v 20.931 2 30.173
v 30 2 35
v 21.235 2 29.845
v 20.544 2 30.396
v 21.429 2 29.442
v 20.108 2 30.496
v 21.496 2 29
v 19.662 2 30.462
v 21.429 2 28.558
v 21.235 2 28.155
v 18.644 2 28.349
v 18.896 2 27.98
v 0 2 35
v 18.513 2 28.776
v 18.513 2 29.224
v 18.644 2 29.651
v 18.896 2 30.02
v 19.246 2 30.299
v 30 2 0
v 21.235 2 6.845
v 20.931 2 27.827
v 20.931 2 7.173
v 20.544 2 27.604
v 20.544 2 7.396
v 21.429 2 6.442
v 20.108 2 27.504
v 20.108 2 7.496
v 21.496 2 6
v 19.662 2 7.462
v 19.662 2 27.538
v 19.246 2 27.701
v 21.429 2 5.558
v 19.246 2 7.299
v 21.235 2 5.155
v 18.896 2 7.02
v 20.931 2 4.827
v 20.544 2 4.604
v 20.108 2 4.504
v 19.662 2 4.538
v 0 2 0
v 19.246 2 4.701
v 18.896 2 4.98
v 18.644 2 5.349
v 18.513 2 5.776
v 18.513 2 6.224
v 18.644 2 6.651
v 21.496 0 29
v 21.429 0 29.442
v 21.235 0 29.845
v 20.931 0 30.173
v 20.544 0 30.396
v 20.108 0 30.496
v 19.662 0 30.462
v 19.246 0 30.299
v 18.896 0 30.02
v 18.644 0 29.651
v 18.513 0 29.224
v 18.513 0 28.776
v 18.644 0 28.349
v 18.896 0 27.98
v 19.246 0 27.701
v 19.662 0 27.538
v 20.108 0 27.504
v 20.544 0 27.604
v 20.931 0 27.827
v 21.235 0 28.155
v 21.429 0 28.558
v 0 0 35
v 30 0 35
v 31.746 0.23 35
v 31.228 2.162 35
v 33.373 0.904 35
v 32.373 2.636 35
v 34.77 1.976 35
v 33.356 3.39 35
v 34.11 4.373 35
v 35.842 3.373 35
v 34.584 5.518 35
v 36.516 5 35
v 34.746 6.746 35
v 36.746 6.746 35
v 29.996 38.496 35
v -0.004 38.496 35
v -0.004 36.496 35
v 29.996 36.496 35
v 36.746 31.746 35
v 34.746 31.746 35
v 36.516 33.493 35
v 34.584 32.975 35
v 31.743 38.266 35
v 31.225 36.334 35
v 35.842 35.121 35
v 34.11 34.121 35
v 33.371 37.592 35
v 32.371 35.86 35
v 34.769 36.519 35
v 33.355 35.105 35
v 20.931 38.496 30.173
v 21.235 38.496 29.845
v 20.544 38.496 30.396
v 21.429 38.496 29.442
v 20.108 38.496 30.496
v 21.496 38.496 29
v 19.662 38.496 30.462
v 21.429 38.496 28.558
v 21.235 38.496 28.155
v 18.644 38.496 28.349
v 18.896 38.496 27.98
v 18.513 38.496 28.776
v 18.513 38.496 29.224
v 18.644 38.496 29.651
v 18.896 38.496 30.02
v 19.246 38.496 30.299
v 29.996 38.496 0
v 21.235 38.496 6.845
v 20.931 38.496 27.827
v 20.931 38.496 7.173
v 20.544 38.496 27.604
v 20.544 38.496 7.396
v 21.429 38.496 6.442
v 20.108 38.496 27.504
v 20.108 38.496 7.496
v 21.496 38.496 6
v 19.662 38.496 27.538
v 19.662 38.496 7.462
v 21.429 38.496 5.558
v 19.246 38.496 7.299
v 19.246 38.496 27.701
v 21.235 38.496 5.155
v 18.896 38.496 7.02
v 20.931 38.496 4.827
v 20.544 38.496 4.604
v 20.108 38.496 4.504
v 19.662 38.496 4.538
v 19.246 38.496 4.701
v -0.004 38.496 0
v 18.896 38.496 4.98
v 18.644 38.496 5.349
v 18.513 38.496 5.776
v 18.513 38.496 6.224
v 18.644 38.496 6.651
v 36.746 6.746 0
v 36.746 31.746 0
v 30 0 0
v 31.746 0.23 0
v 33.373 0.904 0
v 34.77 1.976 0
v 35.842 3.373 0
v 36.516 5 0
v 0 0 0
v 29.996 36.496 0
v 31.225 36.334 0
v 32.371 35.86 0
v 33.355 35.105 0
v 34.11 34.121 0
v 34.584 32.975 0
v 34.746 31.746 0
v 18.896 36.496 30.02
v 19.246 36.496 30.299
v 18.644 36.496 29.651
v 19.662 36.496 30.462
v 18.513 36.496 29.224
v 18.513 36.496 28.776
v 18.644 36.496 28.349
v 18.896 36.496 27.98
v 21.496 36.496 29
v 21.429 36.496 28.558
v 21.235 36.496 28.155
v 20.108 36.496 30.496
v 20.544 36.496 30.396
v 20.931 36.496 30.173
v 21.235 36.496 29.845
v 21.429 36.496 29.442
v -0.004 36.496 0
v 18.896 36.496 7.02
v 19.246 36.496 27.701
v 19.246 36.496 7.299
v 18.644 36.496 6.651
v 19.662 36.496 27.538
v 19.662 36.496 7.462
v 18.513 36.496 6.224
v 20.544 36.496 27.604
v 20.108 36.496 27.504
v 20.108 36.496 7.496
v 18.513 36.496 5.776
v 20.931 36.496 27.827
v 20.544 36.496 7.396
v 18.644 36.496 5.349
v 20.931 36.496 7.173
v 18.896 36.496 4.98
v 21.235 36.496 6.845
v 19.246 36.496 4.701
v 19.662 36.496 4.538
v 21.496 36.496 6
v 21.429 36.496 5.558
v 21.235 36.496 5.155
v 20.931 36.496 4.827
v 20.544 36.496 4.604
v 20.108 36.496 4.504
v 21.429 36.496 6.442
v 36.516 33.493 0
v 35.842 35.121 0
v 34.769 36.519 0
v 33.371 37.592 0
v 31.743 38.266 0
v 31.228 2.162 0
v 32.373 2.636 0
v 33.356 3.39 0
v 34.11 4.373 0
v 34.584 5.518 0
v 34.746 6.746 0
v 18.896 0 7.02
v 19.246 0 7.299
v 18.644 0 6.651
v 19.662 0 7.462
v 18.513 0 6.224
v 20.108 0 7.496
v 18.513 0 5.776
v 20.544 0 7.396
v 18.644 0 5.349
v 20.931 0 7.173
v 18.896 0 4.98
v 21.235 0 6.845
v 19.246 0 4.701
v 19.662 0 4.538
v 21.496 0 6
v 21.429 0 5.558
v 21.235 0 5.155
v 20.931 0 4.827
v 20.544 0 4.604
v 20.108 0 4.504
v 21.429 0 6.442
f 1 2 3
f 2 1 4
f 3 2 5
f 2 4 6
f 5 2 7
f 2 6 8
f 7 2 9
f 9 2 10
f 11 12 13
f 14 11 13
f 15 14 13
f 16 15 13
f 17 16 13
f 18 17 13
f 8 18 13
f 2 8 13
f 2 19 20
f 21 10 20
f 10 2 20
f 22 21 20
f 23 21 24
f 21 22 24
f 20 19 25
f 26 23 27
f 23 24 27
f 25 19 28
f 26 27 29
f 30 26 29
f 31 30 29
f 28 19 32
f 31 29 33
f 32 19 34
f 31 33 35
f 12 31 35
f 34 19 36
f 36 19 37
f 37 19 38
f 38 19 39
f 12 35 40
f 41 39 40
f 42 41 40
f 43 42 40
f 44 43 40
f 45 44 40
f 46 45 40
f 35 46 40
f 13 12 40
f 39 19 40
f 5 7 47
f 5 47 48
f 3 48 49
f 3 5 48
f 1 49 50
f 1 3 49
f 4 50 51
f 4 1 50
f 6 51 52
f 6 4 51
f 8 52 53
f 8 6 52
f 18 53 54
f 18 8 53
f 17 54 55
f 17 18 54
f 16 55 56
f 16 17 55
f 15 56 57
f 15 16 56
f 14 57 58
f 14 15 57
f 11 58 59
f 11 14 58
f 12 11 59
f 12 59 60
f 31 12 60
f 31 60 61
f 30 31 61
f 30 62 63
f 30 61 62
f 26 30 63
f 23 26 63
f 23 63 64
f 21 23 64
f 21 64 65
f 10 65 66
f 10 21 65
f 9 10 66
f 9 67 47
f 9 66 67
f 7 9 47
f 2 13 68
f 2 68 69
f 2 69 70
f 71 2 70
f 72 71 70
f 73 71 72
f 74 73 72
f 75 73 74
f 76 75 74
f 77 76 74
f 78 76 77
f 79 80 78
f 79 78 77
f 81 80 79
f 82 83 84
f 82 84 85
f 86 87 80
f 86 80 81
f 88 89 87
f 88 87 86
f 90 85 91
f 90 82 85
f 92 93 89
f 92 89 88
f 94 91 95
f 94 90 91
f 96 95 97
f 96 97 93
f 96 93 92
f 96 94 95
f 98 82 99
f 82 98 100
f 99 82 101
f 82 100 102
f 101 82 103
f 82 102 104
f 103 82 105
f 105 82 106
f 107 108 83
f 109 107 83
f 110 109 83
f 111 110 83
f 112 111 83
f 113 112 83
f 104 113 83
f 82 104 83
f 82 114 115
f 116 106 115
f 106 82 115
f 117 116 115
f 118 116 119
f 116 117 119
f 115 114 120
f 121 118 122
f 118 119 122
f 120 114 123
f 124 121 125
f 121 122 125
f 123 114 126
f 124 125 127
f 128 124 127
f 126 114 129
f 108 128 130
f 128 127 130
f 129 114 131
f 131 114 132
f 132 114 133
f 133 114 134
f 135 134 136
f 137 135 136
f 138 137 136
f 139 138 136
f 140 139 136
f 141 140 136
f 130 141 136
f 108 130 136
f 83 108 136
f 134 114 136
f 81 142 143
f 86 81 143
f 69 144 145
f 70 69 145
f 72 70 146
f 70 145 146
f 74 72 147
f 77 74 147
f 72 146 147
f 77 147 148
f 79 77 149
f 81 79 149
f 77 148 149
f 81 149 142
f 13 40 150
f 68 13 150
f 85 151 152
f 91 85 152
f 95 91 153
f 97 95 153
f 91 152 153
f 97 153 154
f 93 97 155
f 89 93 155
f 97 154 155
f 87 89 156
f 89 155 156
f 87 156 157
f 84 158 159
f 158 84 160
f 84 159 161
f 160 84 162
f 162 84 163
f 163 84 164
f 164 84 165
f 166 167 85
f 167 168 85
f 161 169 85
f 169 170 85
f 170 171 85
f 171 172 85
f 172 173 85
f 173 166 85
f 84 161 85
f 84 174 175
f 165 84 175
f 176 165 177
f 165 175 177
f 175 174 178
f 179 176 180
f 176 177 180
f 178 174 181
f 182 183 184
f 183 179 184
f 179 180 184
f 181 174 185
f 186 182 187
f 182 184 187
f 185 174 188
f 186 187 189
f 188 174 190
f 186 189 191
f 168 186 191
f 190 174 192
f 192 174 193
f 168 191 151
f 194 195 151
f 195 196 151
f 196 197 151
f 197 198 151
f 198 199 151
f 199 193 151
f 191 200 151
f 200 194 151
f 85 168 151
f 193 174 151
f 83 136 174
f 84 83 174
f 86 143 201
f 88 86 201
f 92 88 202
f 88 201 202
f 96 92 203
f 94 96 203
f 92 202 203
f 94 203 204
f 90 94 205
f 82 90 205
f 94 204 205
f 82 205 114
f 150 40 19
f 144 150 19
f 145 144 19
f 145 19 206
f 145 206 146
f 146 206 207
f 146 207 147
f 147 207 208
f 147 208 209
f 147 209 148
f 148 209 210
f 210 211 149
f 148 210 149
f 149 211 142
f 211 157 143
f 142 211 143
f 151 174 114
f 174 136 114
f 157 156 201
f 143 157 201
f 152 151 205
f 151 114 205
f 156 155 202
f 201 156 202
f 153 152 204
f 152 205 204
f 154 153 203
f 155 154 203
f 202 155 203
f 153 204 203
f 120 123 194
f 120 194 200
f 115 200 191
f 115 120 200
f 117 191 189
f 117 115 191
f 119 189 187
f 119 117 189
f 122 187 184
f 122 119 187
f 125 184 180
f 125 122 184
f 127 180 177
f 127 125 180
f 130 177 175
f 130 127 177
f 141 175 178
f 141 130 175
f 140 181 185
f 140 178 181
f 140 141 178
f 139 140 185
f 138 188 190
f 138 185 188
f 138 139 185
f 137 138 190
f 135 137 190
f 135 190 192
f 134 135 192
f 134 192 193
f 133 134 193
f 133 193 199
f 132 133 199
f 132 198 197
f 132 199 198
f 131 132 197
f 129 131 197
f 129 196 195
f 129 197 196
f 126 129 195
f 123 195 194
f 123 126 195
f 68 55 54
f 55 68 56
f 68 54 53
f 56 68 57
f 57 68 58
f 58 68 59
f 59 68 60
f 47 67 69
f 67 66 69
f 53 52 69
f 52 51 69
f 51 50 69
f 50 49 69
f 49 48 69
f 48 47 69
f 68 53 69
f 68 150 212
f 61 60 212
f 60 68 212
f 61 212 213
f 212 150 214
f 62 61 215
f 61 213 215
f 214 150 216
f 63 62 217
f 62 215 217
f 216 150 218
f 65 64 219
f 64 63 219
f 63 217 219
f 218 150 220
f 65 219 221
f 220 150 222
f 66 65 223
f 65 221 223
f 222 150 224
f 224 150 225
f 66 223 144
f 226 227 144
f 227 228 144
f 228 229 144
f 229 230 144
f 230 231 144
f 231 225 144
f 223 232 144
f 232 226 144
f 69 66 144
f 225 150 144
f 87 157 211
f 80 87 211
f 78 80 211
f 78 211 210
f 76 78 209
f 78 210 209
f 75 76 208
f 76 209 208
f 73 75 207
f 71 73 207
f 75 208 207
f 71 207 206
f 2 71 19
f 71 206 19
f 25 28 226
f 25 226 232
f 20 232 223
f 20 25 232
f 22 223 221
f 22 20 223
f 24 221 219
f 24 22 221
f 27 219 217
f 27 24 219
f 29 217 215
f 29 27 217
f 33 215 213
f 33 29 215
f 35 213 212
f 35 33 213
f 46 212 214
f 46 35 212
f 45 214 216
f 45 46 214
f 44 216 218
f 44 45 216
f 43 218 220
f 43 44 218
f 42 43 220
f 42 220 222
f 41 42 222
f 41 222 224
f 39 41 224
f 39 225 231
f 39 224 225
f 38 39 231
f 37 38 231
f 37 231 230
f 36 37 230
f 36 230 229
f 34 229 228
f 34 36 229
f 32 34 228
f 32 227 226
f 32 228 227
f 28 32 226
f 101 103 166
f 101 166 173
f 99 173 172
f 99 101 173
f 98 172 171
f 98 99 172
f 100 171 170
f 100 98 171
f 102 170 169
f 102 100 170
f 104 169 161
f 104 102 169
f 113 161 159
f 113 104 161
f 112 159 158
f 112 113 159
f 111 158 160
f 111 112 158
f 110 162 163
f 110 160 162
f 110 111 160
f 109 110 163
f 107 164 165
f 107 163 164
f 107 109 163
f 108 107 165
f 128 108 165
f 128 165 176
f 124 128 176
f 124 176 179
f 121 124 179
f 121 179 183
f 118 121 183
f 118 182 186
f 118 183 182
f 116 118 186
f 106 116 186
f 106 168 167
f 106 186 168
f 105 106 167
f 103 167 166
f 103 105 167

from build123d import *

# Parameters (mm, degrees)
BOSS_EXTRUDE1_DEPTH     = 35
CONVERT_SOLID1_DEPTH    = 35
CUT_EXTRUDE1_DEPTH      = 68.63261331
CUT_EXTRUDE1_DEPTH_BACK = 7.5
SKETCH2_R               = 1.5


# Read off the part's stored shape, not the designer's step: Convert-Solid1
with BuildPart() as part:
    # Sketch1 → Boss-Extrude1 (new body)
    with BuildSketch(Plane.XY):
        with BuildLine():
            Line((0, 0), (30, 0))
            ThreePointArc((30, 0), (34.770067359, 1.975826594), (36.745893953, 6.745893953))
            Line((36.745893953, 6.745893953), (36.745893953, 31.745893953))
            ThreePointArc((36.745893953, 31.745893953), (34.768864726, 36.518864726), (29.995893953, 38.495893953))
            Line((29.995893953, 38.495893953), (-0.004106047, 38.495893953))
            Line((-0.004106047, 38.495893953), (-0.004106047, 36.995893953))
            Line((-0.004106047, 36.995893953), (29.995893953, 36.995893953))
            ThreePointArc((29.995893953, 36.995893953), (33.708204554, 35.458204554), (35.245893953, 31.745893953))
            Line((35.245893953, 31.745893953), (35.245893953, 6.75))
            ThreePointArc((35.245893953, 6.75), (33.708204554, 3.037689399), (29.995893953, 1.5))
            Line((29.995893953, 1.5), (0, 1.5))
            Line((0, 1.5), (0, 0))
        make_face()
    extrude(amount=BOSS_EXTRUDE1_DEPTH)

    # Convert-Solid1 outline → Convert-Solid1 (add)
    with BuildSketch(Plane.XY):
        with BuildLine():
            Line((29.995893953, 36.995893953), (-0.004106047, 36.995893953))
            Line((-0.004106047, 36.995893953), (-0.004106047, 36.495893953))
            Line((-0.004106047, 36.495893953), (29.995893953, 36.495893953))
            ThreePointArc((29.995893953, 36.495893953), (33.354651163, 35.104651163), (34.745893953, 31.745893953))
            Line((34.745893953, 31.745893953), (34.745893953, 6.745893953))
            ThreePointArc((34.745893953, 6.745893953), (33.355853797, 3.390040156), (30, 2))
            Line((30, 2), (0, 2))
            Line((0, 2), (0, 1.5))
            Line((0, 1.5), (29.995893953, 1.5))
            ThreePointArc((29.995893953, 1.5), (33.708204554, 3.037689399), (35.245893953, 6.75))
            Line((35.245893953, 6.75), (35.245893953, 31.745893953))
            ThreePointArc((35.245893953, 31.745893953), (33.708204554, 35.458204554), (29.995893953, 36.995893953))
        make_face()
    extrude(amount=CONVERT_SOLID1_DEPTH)

    # Sketch2 → Cut-Extrude1 (cut, two sides: drawn at the far end of the back side and taken through both)
    with BuildSketch(Plane(origin=(54.180486852, 36.495893953, 17.5), x_dir=(0, 0, 1), z_dir=(0, -1, 0)).offset(-CUT_EXTRUDE1_DEPTH_BACK)):
        with Locations(Location((11.5, 34.184592899, 0), (0, 0, 270))):
            Circle(SKETCH2_R)
        with Locations(Location((-11.5, 34.184592899, 0), (0, 0, 270))):
            Circle(SKETCH2_R)
    extrude(amount=CUT_EXTRUDE1_DEPTH + CUT_EXTRUDE1_DEPTH_BACK, mode=Mode.SUBTRACT)


solid = part.part
